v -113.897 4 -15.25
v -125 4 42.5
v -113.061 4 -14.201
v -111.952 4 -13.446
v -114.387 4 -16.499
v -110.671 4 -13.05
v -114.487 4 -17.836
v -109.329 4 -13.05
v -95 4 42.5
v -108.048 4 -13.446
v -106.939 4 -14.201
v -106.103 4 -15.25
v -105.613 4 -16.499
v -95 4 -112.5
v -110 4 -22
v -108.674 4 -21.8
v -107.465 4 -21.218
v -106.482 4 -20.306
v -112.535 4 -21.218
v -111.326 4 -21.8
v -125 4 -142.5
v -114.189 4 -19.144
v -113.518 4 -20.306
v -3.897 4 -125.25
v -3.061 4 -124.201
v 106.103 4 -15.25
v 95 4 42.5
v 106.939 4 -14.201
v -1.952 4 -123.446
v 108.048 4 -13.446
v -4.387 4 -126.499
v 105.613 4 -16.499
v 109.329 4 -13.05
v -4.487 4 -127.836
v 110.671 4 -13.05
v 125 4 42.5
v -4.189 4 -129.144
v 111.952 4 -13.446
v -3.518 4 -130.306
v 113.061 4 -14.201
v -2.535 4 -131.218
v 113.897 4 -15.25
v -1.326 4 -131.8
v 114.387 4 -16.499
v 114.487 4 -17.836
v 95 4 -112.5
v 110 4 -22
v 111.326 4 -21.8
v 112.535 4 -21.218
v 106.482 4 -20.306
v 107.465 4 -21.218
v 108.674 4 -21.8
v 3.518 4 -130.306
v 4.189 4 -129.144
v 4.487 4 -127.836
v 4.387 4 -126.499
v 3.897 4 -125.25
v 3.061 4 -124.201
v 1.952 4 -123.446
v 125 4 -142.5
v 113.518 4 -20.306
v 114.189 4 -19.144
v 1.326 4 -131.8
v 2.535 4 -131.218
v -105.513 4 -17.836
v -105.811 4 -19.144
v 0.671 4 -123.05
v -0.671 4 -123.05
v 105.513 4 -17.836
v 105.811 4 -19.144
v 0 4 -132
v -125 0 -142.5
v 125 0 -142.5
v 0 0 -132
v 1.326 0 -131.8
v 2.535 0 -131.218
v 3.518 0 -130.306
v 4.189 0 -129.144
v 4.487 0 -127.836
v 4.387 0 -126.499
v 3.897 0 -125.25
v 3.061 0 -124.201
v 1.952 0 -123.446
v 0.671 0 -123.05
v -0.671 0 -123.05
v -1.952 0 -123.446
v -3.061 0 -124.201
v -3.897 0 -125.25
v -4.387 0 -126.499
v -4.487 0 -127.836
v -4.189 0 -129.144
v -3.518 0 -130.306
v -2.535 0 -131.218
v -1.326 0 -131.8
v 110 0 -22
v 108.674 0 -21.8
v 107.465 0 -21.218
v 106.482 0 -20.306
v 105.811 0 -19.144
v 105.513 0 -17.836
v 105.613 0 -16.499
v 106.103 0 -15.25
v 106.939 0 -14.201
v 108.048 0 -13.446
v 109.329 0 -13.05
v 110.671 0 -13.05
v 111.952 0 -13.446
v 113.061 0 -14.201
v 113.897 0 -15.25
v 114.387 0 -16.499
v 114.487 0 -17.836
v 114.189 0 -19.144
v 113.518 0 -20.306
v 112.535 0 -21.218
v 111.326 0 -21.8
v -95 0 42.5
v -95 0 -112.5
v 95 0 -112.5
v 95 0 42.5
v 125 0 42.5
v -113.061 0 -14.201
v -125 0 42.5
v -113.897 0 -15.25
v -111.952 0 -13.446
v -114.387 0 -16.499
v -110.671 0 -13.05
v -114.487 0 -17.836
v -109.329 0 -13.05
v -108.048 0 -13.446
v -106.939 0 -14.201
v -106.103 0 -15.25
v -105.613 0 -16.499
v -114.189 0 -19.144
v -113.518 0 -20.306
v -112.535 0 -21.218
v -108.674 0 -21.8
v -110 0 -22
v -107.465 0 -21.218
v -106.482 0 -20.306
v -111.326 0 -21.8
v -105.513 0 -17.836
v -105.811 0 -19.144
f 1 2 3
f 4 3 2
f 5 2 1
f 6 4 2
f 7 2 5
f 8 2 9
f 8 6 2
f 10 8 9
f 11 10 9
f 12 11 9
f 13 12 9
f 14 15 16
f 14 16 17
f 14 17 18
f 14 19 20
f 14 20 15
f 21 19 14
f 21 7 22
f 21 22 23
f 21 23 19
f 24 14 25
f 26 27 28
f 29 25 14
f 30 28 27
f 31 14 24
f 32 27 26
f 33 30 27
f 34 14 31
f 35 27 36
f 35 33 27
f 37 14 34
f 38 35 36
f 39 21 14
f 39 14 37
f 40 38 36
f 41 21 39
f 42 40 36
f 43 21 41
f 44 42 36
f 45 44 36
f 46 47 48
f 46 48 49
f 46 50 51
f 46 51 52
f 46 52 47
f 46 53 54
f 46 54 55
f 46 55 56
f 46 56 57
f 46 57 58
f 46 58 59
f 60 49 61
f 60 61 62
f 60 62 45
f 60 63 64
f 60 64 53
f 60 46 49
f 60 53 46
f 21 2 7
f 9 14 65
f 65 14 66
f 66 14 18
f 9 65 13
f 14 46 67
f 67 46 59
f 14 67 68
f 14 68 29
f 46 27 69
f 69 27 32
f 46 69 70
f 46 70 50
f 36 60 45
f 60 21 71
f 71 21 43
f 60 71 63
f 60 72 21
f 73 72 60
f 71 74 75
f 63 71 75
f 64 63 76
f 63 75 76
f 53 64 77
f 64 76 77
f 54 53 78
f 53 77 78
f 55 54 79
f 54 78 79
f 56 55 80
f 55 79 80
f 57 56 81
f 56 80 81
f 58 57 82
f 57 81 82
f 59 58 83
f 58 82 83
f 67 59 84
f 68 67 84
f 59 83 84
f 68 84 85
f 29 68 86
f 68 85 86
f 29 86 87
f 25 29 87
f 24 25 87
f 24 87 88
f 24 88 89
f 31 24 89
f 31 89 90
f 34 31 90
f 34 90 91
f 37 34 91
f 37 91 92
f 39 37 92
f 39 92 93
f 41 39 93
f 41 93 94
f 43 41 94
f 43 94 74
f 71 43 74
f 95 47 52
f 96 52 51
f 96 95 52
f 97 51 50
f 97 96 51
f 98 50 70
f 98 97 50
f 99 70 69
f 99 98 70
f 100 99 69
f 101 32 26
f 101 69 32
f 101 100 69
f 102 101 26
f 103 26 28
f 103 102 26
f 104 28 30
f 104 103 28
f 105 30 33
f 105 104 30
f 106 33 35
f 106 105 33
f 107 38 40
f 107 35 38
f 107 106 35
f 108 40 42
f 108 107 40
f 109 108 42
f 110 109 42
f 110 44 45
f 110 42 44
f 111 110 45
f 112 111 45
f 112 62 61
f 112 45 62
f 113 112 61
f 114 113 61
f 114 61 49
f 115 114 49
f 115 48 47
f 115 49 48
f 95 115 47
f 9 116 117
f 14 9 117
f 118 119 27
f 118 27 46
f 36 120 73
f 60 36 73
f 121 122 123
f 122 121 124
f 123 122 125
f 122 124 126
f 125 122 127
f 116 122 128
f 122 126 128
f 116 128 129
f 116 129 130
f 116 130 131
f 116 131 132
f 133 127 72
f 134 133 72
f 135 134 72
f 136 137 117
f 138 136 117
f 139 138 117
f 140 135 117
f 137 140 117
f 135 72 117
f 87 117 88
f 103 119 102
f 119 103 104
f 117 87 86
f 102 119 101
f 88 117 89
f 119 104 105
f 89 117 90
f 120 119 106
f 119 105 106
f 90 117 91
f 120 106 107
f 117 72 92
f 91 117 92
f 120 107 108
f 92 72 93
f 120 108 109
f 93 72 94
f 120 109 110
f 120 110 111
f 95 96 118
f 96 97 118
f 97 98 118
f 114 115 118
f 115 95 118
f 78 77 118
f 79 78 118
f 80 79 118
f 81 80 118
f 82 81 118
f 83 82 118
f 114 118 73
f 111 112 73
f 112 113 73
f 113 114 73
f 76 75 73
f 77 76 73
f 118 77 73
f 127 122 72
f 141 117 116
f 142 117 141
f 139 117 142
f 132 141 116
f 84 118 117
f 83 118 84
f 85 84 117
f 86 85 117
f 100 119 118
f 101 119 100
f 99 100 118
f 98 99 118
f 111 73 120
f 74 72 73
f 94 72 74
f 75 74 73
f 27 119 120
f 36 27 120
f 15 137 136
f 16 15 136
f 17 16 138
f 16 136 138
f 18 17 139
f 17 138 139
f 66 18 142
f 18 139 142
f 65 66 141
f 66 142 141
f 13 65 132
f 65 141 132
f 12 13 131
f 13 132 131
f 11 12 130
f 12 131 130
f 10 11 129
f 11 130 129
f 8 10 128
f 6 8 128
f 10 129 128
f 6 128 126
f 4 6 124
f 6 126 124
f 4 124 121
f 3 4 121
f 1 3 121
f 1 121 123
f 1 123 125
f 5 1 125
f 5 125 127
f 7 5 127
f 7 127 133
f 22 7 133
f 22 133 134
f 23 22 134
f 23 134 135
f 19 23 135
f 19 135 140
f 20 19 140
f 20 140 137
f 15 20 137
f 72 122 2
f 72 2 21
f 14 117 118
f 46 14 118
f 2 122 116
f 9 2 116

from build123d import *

# Parameters (mm, degrees)
SKETCH1_W            = 250
SKETCH1_H            = 285
SKETCH1_W_2          = 190
SKETCH1_H_2          = 225
EXTRUDE_THIN1_DEPTH  = 4
SKETCH2_W            = 250
SKETCH2_H            = 100
CUT_EXTRUDE1_DEPTH   = 10
SKETCH3_R            = 4.5
CUT_EXTRUDE2_DEPTH   = 10
LPATTERN1_COUNT      = 2
LPATTERN1_PITCH      = 144.5
LPATTERN1_COUNT_DIR2 = 2
LPATTERN1_PITCH_DIR2 = 144.5
SKETCH4_R            = 4.5
CUT_EXTRUDE3_DEPTH   = 10


with BuildPart() as part:
    # Sketch1 → Extrude-Thin1 (new body)
    with BuildSketch(Plane(origin=(0, 0, 0), x_dir=(1, 0, 0), z_dir=(0, 1, 0))):
        Rectangle(SKETCH1_W, SKETCH1_H)
        Rectangle(SKETCH1_W_2, SKETCH1_H_2, mode=Mode.SUBTRACT)
    extrude(amount=EXTRUDE_THIN1_DEPTH)

    # Sketch2 → Cut-Extrude1 (cut)
    with BuildSketch(Plane.XZ):
        with Locations((0, 92.5)):
            Rectangle(SKETCH2_W, SKETCH2_H)
    extrude(amount=-CUT_EXTRUDE1_DEPTH, mode=Mode.SUBTRACT)

    # Sketch3 → Cut-Extrude2 (cut)
    with BuildSketch(Plane.XZ):
        with Locations(Location((0, -127.5, 0), (0, 0, 270))):
            Circle(SKETCH3_R)
    cut_extrude2 = extrude(amount=-CUT_EXTRUDE2_DEPTH, mode=Mode.SUBTRACT)

    # LPattern1: Cut-Extrude2 2 × 2
    with Locations(*[Vector(-1, 0, 0) * (i * LPATTERN1_PITCH) + Vector(-1, 0, 0) * (j * LPATTERN1_PITCH_DIR2) for i in range(LPATTERN1_COUNT) for j in range(LPATTERN1_COUNT_DIR2) if (i, j) != (0, 0)]):
        add(cut_extrude2, mode=Mode.SUBTRACT)

    # Sketch4 → Cut-Extrude3 (cut)
    with BuildSketch(Plane(origin=(0, 0, 0), x_dir=(-1, 0, 0), z_dir=(0, -1, 0))):
        with Locations(Location((110, 17.5, 0), (0, 0, 90))):
            Circle(SKETCH4_R)
    cut_extrude3 = extrude(amount=-CUT_EXTRUDE3_DEPTH, mode=Mode.SUBTRACT)

    # Mirror1: Cut-Extrude3 across plane
    add(cut_extrude3.mirror(Plane(origin=(0, 0, 0), x_dir=(0, 0, 1), z_dir=(1, 0, 0))), mode=Mode.SUBTRACT)


solid = part.part
